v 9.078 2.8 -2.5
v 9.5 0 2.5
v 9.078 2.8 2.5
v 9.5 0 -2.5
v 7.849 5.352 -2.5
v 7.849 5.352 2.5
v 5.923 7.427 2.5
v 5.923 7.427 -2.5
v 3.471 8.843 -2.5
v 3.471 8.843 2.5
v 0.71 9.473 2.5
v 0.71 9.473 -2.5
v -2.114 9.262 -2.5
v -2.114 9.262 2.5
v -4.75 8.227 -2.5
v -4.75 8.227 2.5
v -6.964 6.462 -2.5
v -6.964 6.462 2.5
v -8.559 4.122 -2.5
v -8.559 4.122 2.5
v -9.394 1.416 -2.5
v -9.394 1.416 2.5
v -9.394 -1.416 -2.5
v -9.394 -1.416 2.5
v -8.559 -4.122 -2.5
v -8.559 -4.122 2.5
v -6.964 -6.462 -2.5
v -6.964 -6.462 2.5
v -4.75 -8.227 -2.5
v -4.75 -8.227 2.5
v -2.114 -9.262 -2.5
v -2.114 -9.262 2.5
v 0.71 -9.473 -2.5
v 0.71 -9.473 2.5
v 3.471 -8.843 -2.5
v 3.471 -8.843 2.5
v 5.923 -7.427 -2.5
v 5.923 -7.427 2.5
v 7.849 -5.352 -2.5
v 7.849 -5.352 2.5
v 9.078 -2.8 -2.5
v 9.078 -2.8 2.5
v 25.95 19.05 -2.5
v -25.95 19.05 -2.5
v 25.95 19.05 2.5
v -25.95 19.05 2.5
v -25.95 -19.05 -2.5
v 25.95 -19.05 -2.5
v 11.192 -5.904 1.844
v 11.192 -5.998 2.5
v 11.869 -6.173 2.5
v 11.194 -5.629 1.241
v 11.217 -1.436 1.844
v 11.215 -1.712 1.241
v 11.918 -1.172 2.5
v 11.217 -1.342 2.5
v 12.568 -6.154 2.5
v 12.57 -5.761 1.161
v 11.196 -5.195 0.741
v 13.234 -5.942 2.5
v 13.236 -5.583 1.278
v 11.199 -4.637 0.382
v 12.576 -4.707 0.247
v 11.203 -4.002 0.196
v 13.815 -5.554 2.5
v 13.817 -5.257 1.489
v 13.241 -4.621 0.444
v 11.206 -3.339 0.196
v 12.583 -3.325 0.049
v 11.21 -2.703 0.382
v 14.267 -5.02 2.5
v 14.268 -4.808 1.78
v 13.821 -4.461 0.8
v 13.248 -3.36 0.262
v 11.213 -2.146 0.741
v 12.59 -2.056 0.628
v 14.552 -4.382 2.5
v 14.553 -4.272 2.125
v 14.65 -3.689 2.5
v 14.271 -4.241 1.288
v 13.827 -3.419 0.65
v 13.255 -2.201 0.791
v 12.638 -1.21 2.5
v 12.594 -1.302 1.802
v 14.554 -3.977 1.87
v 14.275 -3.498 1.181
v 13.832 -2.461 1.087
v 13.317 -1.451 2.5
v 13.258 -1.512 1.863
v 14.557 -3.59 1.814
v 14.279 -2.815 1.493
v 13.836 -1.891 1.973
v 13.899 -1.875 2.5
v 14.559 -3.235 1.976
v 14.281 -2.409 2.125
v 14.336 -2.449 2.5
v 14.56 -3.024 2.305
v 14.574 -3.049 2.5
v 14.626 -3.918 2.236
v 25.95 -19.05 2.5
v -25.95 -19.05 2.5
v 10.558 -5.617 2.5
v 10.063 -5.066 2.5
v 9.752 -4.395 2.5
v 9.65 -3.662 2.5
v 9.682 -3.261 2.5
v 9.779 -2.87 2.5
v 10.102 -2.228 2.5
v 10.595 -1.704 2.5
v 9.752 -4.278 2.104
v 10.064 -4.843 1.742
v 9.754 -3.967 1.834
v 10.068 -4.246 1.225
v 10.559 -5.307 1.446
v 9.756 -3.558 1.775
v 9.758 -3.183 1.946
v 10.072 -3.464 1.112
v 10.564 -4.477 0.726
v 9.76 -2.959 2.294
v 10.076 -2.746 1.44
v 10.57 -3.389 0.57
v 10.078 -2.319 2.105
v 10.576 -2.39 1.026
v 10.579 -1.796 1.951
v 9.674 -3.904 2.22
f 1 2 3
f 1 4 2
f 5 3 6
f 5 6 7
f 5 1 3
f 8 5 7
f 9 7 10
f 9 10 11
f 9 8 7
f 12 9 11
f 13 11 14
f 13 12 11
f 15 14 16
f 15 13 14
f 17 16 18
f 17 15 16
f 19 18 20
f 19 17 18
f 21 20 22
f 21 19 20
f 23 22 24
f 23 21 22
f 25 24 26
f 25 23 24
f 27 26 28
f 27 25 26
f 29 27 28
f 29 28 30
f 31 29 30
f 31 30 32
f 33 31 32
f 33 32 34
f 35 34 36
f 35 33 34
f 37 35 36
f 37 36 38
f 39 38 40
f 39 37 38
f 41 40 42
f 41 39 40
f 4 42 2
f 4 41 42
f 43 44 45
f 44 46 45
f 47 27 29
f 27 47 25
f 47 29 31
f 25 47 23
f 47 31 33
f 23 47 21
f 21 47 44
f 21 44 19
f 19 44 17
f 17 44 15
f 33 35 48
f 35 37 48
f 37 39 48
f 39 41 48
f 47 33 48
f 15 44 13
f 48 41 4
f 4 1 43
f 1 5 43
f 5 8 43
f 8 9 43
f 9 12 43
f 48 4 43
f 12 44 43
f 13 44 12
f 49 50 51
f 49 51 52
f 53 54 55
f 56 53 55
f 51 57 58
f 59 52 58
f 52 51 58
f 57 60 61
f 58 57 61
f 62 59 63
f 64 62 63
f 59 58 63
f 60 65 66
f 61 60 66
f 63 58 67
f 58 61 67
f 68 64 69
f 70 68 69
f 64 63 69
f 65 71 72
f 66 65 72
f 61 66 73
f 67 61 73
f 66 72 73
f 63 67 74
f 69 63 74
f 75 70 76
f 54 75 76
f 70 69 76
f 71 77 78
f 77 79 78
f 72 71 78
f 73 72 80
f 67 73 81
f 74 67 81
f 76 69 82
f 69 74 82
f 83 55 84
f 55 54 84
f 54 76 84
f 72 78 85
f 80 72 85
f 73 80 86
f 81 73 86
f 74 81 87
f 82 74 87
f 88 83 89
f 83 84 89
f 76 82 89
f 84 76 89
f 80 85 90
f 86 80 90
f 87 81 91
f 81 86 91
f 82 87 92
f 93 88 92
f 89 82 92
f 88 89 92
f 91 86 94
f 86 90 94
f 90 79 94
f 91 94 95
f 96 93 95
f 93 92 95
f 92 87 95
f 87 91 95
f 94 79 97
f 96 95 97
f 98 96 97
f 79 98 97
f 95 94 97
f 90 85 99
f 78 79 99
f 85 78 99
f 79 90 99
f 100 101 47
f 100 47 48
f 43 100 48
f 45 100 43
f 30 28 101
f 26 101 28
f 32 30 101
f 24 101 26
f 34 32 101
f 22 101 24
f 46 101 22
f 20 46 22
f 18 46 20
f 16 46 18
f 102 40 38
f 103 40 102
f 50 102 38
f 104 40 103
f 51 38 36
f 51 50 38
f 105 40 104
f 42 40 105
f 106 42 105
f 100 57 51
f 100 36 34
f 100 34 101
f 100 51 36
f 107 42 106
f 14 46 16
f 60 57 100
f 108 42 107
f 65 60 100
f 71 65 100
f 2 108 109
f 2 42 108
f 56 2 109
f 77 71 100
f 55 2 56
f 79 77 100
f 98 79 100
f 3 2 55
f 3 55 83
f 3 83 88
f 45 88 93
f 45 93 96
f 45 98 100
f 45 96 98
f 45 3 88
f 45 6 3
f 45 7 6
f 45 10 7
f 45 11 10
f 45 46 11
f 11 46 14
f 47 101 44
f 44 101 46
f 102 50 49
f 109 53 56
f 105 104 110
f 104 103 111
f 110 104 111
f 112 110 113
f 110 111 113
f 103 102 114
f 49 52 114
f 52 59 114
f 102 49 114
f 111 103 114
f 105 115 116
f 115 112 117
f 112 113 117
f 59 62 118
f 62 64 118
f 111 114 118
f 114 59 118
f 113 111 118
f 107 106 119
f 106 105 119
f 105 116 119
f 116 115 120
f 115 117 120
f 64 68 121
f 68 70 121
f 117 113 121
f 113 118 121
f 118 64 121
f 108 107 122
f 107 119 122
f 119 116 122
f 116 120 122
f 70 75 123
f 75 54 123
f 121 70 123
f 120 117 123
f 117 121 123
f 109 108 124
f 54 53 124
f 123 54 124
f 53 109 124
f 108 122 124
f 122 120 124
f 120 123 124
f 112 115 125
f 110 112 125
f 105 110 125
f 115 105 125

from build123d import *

# Parameters (mm, degrees)
F0_W     = 51.9
F0_H     = 38.1
F0_R     = 9.5
F1_DEPTH = 2.5


with BuildPart() as f1:
    # F0 (on Top) → F1 (new body, symmetric)
    with BuildSketch(Plane.XY):
        Rectangle(F0_W, F0_H)
        Circle(F0_R, mode=Mode.SUBTRACT)
    extrude(amount=F1_DEPTH, both=True)

    # F2 (on face) → F3 (revolve, cut)
    with BuildSketch(Plane.XY.offset(2.5)):
        with BuildLine():
            Line((14.65, -3.6893317878), (12.1541903113, -3.6755036277))
            ThreePointArc((12.1541903113, -3.6755036277), (11.7305653131, -4.8608133553), (11.1916659396, -5.9983566531))
            ThreePointArc((11.1916659396, -5.9983566531), (13.5381939434, -5.768494498), (14.65, -3.6893317878))
        make_face()
        with BuildLine():
            ThreePointArc((11.1916659396, -5.9983566531), (11.7305653131, -4.8608133553), (12.1541903113, -3.6755036277))
            Line((12.1541903113, -3.6755036277), (9.6501534838, -3.6616298846))
            ThreePointArc((9.6501534838, -3.6616298846), (10.0631779609, -5.0659848949), (11.1916659396, -5.9983566531))
        make_face()
    revolve(axis=Axis((12.1500767419, -3.6754808362, 2.5), (0.9999846515, -0.0055404657, 0)), mode=Mode.SUBTRACT)


solid = f1.part
